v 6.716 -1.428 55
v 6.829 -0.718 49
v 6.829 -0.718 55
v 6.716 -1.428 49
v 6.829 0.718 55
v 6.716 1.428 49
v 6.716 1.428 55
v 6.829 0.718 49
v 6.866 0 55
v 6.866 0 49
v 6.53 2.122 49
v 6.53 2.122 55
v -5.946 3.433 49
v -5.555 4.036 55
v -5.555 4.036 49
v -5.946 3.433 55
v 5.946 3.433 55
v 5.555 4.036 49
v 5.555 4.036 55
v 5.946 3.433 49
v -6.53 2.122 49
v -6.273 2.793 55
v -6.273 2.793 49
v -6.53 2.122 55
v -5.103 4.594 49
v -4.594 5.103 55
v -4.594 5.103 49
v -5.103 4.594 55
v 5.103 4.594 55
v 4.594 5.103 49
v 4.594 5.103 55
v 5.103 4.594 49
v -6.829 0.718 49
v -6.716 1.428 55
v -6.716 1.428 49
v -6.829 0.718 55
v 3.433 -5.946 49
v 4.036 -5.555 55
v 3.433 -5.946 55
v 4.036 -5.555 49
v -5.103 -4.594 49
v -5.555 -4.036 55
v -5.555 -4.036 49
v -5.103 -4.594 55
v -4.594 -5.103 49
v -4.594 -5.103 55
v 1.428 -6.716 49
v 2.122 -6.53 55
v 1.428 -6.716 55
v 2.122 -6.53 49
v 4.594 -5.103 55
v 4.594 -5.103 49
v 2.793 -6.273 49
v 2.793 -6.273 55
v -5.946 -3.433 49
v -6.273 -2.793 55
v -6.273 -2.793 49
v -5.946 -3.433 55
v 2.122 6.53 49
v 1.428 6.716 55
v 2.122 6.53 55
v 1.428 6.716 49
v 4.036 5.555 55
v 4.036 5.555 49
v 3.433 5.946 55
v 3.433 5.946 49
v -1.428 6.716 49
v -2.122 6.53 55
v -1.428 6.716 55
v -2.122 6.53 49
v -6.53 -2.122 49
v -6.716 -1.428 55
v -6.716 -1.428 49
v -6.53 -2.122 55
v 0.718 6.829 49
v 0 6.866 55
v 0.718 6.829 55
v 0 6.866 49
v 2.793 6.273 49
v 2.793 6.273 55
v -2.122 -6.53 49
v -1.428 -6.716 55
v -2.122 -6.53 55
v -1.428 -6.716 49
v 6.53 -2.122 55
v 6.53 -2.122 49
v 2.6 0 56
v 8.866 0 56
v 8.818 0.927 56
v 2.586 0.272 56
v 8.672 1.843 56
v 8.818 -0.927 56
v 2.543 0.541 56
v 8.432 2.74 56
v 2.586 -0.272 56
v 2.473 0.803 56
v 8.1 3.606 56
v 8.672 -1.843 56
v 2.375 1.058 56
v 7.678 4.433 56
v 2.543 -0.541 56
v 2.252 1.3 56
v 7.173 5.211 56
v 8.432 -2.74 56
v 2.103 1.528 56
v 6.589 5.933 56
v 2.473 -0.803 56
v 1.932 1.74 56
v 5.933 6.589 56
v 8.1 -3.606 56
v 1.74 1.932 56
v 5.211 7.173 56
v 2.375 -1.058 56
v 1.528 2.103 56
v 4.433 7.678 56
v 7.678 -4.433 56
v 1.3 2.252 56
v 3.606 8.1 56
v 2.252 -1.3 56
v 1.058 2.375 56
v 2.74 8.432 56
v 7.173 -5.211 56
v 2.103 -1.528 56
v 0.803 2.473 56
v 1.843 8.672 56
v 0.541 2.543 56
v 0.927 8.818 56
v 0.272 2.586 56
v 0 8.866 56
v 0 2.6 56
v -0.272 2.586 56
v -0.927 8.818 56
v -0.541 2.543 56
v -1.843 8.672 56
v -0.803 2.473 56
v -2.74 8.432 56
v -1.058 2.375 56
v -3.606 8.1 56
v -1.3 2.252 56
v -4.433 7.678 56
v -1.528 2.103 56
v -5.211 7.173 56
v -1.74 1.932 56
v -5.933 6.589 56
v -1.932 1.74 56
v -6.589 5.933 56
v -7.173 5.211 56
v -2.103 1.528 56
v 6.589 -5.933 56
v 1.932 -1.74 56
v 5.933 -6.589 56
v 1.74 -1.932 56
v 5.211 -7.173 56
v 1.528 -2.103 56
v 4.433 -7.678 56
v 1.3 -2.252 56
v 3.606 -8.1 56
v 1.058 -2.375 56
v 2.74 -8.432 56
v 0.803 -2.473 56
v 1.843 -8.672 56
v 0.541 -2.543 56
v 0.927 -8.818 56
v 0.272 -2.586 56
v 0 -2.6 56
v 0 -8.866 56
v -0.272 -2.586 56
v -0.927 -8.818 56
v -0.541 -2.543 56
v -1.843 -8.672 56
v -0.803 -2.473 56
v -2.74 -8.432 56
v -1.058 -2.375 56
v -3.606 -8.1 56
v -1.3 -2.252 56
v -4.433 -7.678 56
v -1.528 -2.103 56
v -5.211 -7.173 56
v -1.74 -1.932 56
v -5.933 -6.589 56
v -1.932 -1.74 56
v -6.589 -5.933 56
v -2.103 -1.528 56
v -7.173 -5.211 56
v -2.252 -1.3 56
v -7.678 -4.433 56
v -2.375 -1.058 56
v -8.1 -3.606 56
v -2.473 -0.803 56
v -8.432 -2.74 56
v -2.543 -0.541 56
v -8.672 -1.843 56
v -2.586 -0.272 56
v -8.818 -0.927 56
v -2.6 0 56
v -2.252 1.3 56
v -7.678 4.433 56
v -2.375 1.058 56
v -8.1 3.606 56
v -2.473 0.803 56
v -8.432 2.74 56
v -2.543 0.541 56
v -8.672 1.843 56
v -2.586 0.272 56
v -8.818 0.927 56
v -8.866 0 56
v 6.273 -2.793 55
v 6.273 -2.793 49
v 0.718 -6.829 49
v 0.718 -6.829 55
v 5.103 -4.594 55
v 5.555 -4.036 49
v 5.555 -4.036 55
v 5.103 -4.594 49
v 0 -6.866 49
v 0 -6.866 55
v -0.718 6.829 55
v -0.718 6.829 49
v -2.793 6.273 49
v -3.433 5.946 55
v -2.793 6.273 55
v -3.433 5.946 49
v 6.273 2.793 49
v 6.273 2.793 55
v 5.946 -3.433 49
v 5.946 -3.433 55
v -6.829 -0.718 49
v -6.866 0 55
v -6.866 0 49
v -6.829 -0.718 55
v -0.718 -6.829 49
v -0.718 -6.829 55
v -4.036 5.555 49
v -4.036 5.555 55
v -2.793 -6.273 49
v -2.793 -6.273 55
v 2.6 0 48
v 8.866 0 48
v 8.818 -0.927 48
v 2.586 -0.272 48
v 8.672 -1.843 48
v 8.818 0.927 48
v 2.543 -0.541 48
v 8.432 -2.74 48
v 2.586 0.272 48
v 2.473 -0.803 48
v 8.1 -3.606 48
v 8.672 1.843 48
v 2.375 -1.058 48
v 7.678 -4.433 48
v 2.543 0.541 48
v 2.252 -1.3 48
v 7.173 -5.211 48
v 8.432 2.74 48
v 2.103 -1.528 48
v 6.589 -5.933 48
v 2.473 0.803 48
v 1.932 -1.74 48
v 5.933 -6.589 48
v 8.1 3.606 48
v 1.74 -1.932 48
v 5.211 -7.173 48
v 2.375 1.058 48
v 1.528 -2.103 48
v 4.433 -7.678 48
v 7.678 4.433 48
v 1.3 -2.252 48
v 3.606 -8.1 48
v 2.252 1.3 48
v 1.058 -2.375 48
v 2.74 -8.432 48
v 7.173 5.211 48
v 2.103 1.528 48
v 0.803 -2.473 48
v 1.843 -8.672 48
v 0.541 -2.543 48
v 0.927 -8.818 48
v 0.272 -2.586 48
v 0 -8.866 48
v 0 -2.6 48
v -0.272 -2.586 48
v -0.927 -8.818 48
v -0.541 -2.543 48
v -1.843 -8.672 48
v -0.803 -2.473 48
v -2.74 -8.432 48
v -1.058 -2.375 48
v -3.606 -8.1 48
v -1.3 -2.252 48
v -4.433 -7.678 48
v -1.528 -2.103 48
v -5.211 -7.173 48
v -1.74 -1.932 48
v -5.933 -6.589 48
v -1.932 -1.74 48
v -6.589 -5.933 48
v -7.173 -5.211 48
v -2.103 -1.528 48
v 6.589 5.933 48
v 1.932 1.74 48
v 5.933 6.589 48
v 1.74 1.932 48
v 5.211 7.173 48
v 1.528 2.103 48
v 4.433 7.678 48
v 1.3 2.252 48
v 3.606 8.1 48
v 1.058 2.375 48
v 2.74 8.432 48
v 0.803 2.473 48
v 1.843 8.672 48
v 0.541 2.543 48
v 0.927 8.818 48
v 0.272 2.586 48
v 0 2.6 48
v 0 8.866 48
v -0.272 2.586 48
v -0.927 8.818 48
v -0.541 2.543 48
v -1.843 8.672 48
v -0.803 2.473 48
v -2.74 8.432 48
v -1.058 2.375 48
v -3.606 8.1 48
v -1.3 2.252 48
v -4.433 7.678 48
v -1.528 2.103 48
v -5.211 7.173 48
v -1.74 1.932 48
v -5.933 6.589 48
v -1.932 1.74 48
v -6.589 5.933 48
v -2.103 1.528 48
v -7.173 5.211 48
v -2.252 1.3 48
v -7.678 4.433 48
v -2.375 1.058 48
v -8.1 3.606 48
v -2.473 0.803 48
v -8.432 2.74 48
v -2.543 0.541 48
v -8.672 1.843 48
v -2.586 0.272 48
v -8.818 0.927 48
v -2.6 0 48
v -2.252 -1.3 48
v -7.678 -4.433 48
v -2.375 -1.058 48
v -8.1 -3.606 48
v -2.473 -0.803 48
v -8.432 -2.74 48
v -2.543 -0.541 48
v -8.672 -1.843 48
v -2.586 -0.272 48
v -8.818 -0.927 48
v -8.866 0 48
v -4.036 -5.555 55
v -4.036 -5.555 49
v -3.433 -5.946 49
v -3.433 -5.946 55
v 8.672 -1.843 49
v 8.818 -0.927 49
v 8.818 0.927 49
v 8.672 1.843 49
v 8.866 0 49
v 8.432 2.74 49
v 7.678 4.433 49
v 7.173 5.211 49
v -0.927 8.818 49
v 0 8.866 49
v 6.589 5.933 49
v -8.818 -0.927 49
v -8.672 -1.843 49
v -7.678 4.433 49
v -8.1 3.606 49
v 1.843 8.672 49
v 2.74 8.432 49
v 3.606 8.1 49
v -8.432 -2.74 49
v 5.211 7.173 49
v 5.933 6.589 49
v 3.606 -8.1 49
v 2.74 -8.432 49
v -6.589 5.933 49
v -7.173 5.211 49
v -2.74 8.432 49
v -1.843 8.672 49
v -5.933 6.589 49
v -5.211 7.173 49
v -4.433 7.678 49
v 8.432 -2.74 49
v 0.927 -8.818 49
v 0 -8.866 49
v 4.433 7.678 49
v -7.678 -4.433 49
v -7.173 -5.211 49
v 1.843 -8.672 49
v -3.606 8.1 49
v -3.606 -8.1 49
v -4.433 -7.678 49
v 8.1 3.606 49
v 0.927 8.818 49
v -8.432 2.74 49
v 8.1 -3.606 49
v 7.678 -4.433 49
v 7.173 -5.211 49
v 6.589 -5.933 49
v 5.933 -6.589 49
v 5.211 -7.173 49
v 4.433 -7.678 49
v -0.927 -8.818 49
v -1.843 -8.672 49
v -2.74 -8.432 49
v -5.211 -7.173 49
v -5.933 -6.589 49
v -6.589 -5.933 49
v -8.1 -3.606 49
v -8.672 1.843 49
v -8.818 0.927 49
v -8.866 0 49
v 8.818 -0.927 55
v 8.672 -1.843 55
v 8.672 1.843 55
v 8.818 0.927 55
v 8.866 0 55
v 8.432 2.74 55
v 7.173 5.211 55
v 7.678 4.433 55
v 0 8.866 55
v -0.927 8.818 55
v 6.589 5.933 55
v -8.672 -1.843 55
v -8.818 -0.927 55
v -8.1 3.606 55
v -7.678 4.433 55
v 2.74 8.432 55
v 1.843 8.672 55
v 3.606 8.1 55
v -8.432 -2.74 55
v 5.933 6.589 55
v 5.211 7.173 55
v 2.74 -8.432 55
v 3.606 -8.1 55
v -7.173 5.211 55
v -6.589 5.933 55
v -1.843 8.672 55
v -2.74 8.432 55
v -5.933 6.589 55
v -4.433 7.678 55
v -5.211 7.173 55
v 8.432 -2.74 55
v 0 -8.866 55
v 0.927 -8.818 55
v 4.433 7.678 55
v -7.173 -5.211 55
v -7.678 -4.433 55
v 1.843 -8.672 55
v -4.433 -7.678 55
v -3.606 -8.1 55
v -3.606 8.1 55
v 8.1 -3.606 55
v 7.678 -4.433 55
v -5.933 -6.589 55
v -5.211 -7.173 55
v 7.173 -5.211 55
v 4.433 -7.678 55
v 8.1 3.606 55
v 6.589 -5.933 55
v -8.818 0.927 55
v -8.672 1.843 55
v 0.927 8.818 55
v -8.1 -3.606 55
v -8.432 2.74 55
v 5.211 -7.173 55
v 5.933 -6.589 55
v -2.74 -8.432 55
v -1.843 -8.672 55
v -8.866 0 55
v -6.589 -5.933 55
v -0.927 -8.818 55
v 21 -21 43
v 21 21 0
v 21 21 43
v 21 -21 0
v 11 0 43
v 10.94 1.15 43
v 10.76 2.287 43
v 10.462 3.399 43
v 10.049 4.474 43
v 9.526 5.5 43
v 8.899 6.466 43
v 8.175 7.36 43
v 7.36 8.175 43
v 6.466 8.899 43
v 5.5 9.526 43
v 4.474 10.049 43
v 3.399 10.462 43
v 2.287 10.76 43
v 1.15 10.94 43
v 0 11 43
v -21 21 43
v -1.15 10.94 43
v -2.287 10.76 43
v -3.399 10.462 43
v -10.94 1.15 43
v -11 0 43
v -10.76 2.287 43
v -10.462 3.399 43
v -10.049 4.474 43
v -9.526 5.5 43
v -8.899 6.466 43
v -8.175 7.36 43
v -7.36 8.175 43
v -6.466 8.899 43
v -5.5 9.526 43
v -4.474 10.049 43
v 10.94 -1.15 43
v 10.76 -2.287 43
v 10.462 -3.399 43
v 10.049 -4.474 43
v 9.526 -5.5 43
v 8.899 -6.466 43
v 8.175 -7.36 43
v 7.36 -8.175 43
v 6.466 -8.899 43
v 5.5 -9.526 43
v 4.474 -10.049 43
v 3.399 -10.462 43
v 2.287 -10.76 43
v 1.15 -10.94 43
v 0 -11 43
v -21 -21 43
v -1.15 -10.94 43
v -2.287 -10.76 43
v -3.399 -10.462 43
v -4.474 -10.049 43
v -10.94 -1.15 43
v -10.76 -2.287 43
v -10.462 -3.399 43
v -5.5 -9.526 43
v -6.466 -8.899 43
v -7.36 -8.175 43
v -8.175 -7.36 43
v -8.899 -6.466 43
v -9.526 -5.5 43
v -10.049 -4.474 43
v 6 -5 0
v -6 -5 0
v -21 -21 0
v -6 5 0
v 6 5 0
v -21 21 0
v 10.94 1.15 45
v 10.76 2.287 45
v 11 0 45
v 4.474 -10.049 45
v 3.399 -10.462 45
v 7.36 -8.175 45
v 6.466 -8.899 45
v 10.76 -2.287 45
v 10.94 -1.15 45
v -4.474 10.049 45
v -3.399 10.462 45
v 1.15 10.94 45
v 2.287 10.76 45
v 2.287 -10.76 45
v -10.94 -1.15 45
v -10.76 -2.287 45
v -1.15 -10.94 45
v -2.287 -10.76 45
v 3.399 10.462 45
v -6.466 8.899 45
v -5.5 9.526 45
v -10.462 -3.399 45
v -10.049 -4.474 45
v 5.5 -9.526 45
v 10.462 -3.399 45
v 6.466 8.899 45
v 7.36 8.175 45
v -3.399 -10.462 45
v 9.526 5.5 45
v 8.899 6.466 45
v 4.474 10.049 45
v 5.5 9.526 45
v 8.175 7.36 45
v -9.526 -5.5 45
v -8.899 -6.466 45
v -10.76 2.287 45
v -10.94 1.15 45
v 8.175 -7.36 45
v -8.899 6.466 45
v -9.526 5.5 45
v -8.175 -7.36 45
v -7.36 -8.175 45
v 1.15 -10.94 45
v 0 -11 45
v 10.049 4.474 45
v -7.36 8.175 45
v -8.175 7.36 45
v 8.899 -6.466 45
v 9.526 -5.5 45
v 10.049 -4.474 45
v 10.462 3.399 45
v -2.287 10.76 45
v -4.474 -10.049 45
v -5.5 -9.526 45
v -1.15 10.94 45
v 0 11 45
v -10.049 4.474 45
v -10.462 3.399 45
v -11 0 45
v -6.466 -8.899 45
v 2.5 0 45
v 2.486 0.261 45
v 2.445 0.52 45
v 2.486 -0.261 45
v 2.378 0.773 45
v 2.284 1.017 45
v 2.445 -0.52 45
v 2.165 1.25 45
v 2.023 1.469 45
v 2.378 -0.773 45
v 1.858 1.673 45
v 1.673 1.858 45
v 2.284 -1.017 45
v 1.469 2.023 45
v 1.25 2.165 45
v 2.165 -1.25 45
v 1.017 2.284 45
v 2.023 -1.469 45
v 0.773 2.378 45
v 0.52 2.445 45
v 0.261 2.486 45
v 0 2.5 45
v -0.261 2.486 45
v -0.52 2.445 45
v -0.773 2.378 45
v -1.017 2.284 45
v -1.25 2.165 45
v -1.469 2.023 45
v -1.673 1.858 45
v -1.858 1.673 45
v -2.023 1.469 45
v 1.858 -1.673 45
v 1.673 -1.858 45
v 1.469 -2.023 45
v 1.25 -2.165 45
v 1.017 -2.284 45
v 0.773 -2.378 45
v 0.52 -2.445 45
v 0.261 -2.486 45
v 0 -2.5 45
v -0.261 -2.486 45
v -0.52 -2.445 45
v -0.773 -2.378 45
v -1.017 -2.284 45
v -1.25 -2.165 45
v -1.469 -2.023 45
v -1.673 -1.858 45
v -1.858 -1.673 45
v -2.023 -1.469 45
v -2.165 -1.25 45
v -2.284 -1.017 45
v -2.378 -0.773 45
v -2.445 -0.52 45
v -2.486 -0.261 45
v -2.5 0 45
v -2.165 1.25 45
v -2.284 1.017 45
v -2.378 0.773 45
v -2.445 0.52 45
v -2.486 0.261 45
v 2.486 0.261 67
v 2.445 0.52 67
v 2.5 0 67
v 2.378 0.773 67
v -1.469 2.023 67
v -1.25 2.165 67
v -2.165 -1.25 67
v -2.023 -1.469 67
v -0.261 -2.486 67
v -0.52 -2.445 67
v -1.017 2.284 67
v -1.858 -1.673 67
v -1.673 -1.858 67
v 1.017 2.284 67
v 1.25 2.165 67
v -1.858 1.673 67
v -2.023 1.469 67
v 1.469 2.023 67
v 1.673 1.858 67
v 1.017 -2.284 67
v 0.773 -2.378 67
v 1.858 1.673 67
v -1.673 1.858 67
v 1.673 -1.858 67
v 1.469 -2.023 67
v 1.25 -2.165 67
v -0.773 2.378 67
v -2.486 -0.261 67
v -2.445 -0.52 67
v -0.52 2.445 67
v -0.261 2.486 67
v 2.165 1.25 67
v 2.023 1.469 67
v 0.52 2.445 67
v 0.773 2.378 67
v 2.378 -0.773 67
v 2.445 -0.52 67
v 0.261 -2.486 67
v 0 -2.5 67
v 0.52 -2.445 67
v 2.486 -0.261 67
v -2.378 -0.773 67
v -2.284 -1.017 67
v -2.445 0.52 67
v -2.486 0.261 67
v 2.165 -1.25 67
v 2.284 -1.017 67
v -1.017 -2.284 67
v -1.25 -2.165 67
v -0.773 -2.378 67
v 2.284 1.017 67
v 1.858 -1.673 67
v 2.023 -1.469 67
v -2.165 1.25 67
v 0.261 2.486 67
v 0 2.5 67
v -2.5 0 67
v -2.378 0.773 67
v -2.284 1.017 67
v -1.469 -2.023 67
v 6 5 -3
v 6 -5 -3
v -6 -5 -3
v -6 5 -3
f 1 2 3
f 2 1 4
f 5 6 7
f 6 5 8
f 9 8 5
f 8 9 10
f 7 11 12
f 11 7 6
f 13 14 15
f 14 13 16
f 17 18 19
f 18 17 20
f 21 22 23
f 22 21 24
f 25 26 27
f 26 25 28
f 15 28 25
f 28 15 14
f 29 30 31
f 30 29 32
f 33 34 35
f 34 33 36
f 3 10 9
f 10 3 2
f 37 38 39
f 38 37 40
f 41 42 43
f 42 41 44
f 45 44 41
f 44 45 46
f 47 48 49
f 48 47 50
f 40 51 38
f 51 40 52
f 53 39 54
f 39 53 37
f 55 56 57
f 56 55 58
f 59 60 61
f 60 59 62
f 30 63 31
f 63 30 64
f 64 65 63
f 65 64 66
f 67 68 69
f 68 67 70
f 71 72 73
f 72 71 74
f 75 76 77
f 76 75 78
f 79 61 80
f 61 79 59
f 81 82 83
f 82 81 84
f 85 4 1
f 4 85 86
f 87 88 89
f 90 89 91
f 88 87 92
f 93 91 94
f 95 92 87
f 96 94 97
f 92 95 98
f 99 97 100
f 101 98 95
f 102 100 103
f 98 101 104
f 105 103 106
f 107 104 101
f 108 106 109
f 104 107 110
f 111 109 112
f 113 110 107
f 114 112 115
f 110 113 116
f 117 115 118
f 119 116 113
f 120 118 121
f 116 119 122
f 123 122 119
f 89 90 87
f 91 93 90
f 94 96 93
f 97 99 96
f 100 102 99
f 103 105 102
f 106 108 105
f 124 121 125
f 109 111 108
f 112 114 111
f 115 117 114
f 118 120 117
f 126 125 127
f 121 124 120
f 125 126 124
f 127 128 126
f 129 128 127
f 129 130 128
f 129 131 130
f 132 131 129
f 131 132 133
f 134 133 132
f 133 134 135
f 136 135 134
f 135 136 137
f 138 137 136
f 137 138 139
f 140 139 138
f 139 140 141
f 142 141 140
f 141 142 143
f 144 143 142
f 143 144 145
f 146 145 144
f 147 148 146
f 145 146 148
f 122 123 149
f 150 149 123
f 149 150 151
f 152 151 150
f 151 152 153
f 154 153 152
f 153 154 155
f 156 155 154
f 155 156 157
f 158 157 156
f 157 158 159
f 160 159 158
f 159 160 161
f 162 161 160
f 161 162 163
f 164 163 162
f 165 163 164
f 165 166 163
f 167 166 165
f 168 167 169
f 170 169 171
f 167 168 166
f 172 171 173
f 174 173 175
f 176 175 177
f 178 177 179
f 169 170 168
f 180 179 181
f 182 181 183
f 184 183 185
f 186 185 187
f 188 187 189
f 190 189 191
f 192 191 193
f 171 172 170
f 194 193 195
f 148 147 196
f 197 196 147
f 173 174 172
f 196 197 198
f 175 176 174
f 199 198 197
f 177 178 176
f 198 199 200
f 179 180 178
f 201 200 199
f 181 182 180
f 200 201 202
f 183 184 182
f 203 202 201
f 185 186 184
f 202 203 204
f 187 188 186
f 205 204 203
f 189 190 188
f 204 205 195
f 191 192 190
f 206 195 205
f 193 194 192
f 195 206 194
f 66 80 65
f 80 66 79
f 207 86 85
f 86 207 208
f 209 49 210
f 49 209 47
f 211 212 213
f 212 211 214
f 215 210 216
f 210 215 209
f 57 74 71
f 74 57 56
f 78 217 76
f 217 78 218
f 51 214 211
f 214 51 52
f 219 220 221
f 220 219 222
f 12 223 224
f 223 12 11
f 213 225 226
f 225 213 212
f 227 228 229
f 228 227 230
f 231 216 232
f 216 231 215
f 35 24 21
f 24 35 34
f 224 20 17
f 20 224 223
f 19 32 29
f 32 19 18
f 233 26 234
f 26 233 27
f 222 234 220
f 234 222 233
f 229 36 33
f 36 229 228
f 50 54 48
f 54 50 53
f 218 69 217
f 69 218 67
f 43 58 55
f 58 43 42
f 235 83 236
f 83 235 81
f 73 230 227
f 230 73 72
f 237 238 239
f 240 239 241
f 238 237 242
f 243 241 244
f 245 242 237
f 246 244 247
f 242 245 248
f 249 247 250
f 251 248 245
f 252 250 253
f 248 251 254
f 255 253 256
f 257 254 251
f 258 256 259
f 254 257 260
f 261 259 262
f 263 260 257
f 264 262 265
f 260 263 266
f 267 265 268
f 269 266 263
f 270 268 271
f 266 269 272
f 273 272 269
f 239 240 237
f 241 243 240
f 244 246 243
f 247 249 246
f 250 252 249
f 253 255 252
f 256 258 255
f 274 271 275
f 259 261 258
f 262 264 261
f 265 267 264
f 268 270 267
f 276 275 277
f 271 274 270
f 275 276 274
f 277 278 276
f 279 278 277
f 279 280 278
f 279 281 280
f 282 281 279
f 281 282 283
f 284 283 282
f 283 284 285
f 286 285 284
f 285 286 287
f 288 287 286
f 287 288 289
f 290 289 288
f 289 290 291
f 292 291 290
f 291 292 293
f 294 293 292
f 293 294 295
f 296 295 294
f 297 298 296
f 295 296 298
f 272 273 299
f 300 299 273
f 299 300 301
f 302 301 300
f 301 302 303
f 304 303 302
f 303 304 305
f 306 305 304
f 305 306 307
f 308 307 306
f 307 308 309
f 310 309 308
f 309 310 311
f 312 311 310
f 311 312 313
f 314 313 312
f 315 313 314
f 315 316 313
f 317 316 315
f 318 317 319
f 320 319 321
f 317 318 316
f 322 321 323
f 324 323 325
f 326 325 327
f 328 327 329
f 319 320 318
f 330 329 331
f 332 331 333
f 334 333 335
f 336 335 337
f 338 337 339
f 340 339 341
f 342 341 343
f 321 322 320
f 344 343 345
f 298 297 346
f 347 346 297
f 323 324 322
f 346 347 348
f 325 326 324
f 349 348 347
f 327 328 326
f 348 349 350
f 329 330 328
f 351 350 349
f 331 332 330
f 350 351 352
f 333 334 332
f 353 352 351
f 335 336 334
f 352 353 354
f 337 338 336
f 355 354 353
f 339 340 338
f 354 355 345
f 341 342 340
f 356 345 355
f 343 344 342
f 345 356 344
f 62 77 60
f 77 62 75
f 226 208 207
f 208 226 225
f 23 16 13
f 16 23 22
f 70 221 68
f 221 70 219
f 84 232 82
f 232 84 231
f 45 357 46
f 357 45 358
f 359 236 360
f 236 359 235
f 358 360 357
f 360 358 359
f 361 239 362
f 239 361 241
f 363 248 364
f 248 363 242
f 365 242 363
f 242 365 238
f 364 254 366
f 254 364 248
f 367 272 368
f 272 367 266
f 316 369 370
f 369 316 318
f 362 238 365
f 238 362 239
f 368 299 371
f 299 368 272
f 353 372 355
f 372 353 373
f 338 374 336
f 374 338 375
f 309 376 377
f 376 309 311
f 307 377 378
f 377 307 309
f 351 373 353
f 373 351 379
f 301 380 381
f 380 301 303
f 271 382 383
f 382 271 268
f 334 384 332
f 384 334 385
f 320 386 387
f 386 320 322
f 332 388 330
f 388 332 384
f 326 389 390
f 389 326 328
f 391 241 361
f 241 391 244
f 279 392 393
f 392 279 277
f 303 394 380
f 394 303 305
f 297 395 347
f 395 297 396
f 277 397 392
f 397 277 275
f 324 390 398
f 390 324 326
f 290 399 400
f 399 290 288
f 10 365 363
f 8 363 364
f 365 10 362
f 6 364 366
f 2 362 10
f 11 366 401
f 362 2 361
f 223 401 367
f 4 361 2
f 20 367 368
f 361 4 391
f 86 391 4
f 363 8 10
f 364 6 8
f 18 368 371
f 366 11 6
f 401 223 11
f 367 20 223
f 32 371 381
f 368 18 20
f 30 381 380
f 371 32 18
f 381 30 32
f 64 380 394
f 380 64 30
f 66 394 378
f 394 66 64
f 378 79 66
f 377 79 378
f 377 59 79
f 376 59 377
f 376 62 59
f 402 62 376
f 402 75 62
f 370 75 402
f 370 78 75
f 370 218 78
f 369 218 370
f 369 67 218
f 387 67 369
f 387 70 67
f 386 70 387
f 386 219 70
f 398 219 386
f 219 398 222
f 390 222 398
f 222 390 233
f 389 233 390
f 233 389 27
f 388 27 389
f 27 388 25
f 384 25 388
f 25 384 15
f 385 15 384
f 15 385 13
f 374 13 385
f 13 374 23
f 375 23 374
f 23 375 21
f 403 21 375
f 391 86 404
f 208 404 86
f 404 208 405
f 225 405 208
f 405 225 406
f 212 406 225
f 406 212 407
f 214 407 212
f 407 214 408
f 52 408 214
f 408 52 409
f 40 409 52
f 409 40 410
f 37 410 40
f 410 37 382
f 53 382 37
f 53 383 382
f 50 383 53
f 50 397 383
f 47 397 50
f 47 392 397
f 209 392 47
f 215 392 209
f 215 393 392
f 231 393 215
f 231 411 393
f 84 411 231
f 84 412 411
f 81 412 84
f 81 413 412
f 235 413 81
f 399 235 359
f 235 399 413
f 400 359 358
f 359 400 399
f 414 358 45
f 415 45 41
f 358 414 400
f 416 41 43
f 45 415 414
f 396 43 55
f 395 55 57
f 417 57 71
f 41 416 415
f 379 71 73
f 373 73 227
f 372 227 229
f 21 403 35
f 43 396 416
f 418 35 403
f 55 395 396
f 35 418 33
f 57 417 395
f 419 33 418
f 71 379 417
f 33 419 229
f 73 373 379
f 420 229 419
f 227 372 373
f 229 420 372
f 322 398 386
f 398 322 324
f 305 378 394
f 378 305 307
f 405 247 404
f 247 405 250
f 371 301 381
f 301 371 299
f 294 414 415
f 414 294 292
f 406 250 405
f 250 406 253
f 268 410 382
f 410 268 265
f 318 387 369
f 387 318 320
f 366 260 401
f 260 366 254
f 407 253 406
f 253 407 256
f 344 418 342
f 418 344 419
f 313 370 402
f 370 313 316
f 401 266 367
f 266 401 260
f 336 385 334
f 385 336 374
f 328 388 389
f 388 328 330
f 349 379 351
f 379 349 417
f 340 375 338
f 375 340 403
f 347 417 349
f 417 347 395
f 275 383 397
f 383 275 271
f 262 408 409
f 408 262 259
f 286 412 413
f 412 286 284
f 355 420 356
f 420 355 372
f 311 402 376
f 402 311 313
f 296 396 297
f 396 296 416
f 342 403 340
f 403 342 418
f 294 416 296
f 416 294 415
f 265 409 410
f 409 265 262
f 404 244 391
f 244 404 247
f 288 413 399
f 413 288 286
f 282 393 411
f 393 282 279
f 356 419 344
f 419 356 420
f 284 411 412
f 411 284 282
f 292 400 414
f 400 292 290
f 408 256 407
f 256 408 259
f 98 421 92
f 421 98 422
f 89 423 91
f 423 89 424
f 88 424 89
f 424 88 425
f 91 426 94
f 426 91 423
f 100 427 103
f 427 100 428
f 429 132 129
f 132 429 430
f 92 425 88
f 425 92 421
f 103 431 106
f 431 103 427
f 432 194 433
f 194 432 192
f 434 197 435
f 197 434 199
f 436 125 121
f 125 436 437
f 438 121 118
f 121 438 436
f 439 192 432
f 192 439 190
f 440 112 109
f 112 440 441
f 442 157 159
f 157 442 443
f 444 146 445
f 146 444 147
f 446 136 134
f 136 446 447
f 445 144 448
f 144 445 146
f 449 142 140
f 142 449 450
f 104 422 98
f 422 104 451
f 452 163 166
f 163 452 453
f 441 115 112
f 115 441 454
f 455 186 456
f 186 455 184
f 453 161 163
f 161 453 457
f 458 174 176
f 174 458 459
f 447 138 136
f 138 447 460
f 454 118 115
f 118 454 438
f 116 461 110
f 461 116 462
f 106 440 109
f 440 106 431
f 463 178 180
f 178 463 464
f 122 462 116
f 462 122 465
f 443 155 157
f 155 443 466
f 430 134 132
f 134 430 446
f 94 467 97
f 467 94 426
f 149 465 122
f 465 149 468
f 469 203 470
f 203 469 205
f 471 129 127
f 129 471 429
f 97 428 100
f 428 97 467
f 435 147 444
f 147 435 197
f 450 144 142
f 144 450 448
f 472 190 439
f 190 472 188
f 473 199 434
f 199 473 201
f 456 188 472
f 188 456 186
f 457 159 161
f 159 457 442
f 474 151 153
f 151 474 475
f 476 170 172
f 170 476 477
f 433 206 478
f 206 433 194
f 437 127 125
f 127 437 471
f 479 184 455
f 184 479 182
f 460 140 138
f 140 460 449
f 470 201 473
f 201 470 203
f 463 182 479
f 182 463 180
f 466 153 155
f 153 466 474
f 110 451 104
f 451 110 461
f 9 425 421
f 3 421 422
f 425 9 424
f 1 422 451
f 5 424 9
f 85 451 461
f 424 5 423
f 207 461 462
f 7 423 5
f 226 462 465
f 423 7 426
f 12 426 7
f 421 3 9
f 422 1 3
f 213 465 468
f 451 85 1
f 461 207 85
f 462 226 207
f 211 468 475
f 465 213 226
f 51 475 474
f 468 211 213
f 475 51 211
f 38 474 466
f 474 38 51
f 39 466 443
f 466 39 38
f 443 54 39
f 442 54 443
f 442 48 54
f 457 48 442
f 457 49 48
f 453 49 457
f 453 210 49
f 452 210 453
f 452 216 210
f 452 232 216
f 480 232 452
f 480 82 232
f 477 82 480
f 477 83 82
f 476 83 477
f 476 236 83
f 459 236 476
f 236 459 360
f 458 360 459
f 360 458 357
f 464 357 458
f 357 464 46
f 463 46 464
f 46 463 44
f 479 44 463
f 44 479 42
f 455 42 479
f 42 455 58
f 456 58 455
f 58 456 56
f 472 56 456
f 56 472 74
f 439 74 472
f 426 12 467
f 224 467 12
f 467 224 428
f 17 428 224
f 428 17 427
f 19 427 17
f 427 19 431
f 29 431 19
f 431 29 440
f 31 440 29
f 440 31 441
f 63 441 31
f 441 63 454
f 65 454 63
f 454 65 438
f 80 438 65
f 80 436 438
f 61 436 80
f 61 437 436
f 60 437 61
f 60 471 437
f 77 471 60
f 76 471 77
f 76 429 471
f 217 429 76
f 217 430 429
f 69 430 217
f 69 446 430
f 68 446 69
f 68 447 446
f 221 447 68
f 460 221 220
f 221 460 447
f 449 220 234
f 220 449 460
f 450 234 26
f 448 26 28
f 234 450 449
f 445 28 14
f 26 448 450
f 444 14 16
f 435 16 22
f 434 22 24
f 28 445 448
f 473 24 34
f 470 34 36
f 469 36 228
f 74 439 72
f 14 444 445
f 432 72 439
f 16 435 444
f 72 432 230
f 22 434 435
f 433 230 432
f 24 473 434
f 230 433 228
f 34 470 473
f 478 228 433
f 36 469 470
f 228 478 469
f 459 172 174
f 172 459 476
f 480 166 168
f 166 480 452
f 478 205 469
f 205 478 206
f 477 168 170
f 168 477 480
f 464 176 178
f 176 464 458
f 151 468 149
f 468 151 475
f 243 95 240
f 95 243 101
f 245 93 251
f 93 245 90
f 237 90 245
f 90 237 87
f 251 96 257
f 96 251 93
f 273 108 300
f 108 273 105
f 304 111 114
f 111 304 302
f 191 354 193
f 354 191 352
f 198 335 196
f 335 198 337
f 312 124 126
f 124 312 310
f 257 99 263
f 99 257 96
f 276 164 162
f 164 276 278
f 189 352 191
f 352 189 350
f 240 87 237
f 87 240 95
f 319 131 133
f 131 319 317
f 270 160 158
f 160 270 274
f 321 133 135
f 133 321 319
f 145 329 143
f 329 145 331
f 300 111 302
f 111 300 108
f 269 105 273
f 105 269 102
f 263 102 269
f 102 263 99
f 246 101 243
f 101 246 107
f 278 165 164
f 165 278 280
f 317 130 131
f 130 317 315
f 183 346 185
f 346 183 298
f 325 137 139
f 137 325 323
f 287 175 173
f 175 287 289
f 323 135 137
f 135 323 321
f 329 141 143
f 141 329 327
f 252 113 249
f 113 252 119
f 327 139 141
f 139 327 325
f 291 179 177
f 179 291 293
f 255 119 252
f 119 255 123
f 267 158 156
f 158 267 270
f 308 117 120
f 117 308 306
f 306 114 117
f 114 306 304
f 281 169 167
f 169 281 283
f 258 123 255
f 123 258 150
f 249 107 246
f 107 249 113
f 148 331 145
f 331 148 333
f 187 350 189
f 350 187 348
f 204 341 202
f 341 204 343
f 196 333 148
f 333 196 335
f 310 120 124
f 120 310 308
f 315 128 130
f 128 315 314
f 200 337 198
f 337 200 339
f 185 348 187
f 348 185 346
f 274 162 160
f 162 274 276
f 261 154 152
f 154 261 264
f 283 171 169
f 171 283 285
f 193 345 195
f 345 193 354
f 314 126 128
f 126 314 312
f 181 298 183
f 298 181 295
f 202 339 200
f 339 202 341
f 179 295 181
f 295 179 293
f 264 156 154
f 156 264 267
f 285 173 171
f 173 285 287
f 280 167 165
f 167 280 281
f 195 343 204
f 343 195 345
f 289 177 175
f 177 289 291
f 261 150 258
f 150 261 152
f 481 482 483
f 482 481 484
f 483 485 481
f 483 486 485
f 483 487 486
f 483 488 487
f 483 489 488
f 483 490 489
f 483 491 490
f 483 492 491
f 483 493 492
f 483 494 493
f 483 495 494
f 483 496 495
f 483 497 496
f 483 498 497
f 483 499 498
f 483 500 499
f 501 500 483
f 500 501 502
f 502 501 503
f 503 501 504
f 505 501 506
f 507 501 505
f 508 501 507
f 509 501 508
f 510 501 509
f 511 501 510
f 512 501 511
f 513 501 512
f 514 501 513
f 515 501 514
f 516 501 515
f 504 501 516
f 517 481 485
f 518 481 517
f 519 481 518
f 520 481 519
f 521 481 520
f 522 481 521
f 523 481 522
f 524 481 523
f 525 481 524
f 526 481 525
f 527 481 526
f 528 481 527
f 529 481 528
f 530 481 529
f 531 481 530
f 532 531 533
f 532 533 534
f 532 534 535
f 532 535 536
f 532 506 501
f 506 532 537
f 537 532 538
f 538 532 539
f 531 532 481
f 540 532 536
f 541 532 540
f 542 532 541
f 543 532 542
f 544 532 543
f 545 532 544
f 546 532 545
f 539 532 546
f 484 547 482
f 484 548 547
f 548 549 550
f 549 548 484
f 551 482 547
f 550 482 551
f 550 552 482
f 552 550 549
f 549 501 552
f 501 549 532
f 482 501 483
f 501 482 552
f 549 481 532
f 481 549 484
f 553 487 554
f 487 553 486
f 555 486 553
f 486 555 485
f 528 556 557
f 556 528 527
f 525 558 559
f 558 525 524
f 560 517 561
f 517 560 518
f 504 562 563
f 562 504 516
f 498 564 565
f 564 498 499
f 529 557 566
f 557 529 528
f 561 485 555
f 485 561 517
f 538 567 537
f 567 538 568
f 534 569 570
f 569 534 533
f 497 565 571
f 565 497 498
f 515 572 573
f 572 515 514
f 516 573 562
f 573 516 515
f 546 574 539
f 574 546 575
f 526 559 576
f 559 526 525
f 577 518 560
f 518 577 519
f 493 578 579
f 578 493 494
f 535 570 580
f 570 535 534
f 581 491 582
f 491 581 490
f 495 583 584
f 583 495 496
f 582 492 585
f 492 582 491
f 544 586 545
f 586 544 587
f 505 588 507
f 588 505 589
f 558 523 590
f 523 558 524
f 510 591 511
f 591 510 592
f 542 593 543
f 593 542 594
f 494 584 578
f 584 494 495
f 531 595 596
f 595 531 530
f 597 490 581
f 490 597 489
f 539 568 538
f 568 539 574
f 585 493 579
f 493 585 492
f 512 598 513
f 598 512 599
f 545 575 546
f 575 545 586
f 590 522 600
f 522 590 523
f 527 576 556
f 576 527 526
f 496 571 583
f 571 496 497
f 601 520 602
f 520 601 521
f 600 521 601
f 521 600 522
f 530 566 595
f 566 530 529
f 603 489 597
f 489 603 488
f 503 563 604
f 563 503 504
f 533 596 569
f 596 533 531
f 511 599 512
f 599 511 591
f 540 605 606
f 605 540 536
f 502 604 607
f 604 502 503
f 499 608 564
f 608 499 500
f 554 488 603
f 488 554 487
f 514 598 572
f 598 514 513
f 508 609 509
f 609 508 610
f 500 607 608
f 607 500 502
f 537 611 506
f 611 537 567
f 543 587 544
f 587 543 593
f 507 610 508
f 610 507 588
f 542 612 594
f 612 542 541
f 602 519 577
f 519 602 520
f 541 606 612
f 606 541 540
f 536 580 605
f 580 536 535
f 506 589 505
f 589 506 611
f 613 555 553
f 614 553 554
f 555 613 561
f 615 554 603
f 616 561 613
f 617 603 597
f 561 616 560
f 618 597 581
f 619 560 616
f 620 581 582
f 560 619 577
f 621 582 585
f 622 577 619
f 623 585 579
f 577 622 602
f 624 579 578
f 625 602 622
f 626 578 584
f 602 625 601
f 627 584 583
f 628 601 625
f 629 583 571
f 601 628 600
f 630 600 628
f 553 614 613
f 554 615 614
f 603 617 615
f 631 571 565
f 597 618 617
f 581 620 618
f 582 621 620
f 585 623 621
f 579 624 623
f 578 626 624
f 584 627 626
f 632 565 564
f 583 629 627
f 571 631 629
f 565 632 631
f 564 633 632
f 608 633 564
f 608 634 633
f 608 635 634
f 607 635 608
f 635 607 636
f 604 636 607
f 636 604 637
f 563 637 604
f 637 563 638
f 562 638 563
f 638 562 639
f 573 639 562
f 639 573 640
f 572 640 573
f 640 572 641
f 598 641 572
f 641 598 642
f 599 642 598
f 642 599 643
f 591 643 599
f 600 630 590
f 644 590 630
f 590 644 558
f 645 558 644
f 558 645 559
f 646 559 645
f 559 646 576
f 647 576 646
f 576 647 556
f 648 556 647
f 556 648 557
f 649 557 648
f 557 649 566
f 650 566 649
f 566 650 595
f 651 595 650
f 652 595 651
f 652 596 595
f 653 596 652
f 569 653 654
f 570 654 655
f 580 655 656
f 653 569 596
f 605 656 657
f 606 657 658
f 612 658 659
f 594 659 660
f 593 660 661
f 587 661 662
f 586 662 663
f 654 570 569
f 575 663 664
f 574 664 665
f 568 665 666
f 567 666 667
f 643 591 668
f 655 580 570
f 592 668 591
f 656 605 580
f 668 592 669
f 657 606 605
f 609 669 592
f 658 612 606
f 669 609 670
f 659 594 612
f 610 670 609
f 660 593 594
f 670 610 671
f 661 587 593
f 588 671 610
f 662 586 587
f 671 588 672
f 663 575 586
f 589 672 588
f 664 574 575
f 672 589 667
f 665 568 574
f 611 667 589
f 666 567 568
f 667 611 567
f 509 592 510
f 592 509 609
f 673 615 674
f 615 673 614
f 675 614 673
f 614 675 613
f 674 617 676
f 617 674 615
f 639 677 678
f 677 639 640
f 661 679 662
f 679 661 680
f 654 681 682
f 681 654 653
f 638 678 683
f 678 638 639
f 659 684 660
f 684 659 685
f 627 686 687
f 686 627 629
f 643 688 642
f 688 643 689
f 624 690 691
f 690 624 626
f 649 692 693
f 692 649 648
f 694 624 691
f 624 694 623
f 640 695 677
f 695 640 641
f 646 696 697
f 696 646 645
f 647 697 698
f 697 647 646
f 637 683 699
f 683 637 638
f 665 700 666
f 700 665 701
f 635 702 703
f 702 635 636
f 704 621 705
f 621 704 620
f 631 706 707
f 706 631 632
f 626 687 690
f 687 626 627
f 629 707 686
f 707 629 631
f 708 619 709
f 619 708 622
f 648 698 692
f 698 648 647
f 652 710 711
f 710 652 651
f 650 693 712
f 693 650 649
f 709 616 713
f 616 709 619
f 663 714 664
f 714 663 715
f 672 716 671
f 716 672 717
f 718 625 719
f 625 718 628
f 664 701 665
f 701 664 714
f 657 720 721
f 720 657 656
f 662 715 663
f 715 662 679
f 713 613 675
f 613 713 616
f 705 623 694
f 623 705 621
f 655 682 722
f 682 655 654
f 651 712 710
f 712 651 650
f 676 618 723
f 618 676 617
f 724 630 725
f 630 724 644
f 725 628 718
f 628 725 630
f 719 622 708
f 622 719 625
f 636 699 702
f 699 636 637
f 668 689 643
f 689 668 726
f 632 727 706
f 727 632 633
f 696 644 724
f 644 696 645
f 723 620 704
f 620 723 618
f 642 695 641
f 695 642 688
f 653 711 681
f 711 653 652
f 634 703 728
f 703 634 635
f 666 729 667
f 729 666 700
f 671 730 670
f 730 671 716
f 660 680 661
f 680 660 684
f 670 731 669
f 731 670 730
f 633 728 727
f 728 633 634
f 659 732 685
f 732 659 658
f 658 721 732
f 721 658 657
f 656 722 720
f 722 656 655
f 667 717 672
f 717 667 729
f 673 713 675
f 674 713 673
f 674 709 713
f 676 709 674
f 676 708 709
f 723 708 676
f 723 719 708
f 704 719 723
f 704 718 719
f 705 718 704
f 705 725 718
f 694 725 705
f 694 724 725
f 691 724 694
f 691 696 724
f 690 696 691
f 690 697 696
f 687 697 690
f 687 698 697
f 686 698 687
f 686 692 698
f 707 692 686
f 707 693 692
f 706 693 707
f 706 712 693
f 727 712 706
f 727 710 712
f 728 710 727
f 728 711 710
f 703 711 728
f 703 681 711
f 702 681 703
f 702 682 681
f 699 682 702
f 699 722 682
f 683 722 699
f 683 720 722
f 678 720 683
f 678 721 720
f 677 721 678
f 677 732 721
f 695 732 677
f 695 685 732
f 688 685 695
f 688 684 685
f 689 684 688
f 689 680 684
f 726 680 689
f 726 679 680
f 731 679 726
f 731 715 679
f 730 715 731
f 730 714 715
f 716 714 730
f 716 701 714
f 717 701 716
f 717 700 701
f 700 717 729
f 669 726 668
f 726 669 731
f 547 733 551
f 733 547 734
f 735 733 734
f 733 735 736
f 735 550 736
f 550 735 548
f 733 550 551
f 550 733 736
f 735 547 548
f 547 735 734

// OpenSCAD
// file: _params.scad
// =========================================================================
// 공유 파라미터 (모든 개별 부품 파일에서 include)
// 메인 어셈블리: cup_z_x_catrage_frame_water_mic_anti_3030.scad 에서 추출
// 프레임: 600 × 420 × 700mm (3030 프로파일, Y=0 대칭)
// =========================================================================

$fn = 60;  // 부품 출력용 고해상도
GLOBAL_TOLERANCE = 0.2;

// --- [1] 하부 기성품 및 원통 파라미터 ---
X_RAIL_LEN = 290.0;
X_BLOCK_W = 42.0; X_BLOCK_L = 59.0;
X_PITCH_X = 20.0; X_PITCH_Y = 32.0;
X_RAIL_W = 40.0;  X_RAIL_H = 30.0;

MOTOR_W = 42.0;      MOTOR_PITCH = 31.0; MOTOR_HOLE_D = 3.5;    
MOTOR_BOSS_D = 22.0; MOTOR_BOSS_H = 2.0; SCREW_D = 8.0;         

CUP_ID = 100.0;  CUP_WALL = 5.0; CUP_OD = 110.0;     // 아크릴 원통 OD110/ID100
CUP_H = 180.0;   CAGE_H = 60.0;  FLOOR_H = 10.0; PISTON_H = 20.0;     

LIP_D = 30.0;    LIP_H = 5.0;    LEAK_DRAIN_D = 4.0;    
GUIDE_PIPE_D = 10.0; BUSHING_OD = 12.0; BUSHING_H = 8.0;       
DRAIN_RADIUS = 35.0; DRAIN_D = 10.0;        

Y_OFFSET = 85.0; BRKT_H = 12.0; BRKT_D = 122.0; BRKT_ID = 62.0; Z_MOUNT_PCD = 86.0;   

// --- [2] 아크릴 파이프 및 상부 카트리지 ---
ACRYL_ID = 100.0; ACRYL_T = 5.0; ACRYL_OD = ACRYL_ID + (ACRYL_T * 2);  // OD110 (아크릴집 106 재고없음 → 컵과 동일 규격)

REVOLVER_PCD = 240.0;     // 인접 카트리지 웹 9.8mm 확보 (OD110 대응, 230→240)
CARTRIDGE_OD = REVOLVER_PCD + ACRYL_OD + 8; 
TOP_PLATE_H = 15.0;       // 아크릴 15T 통판 (보스홀 단 깊이 10mm)

HUB_D = 60.0;            
SHAFT_D = 12.0;          
HUB_WALL = 4.0;          
HUB_H = 15.0;             // 아크릴 5T × 3장 적층 — 파이프 130mm 대응
POCKET_DEPTH = 5.0;
MID_HUB_Z = 68.5;          // 중단 허브 하면 Z (FLOAT_H=2 보정, 절대좌표 유지)
UPPER_HUB_Z = 135.0;       // 상단 허브 하면 Z (전체 135+15=150 유지)
BOSS_OD = 35.0;
BOSS_H = 11.0;             // 보스11 + 와셔1 = 12, 리세스10 → 허브 2mm 공중

// --- [3] GT2 벨트 구동 시스템 ---
GT2_PITCH     = 2.0;
GT2_BELT_W    = 6.0;
BIG_PULLEY_TEETH = 566;
BIG_PULLEY_PD = BIG_PULLEY_TEETH * GT2_PITCH / PI;
BIG_PULLEY_OD = BIG_PULLEY_PD + 1.0;
SMALL_PULLEY_TEETH = 20;
SMALL_PULLEY_PD = SMALL_PULLEY_TEETH * GT2_PITCH / PI;
SMALL_PULLEY_OD = SMALL_PULLEY_PD + 1.0;

BELT_MOTOR_X = -300;
BELT_MOTOR_Y = -155.5;
BRKT_MOTOR_H = 25.0;
BRKT_MOTOR_W = 45.0;
SLOT_LEN = 10.0;
FLAG_W = 15.0;  FLAG_H = 8.0;  FLAG_T = 1.5;

X_POS_MEASURE = 170.0;   // X_M~X_R 정중앙, X대칭

// --- [4] 3030 프레임 경계 (600×430×700mm) ---
PF = 30;             // 3030 알루미늄 프로파일
WASHER_T = 1.0;     

X_L = -320;
X_M = 60;
X_R = 250;
Y_F = -210;          // 전방 (대칭: -210+30=-180, Y=0 중심)
Y_B = 180;           // 후방 (대칭: 180+30=210, Y=0 중심) — 메인파일과 동기화

Z_BOT = -480;
Z_RAIL = -322;
Z_MID = -TOP_PLATE_H - PF;
Z_TOP = 220;

SUPPORT_PILLAR_H = Z_TOP - PF;

SHAFT_SQ = 20;       // 2020 사각 회전축

// 사각 축 홀 크기
SQ = SHAFT_SQ + GLOBAL_TOLERANCE;  // 20.2mm

// --- 리볼버/컵 축 정렬 (보스홀=판 중심에 리볼버 정렬) ---
REVOLVER_CX = (X_L + X_M + PF)/2;        // 판 중심 = 보스홀 = 리볼버 회전축 (-115)
DROP_X      = REVOLVER_CX + REVOLVER_PCD/2;  // 링 드롭 / 컵 적재 축 (+5)

// --- [5] 모터 체결홀 (베이스 플레이트 ↔ 모터 브래킷 슬롯 공유) ---
MOTOR_BOLT_PITCH    = 25;        // Y피치 (모터축 기준 ±12.5)
MOTOR_BOLT_X_NOMINAL = X_L + 55; // 1열: 판 좌단 55 (모터 기본 위치)
MOTOR_BOLT_X_SHIFT   = X_L + 40; // 2열: 판 좌단 40 (모터 좌측 이동 대비)

// 모터 마운트 볼트 카운터보어 (단볼트용 — 브래킷 두께 25 중 깊게 파냄)
MOTOR_CB_D     = 6.5;            // M3 캡볼트 머리 클리어런스
MOTOR_CB_DEPTH = 19;             // 카운터보어 깊이 (잔여 통과 6mm → M3×10 단볼트)
// main file
// =========================================================================
// [구매] 벨트 구동 모터 + 풀리 세트
// 구매: NEMA17 + GT2 20T 풀리 + GT2 타이밍벨트
// 메인 파일 belt_drive_motor_assembly() 구매 부품만 추출 (브래킷 제외)
// 원점: 모터 하면(브래킷 접촉면) = Z=0, 축 상향
// =========================================================================
include <_params.scad>

MOT_BODY_L = 43;
SHAFT_L = 24;
PULLEY_Z = MOT_BODY_L + 5;

// ── ① NEMA 17 모터 본체 (축 상향) ──
color([0.1, 0.1, 0.1])
    translate([-MOTOR_W/2, -MOTOR_W/2, 0])
        cube([MOTOR_W, MOTOR_W, MOT_BODY_L]);

// ── ② 모터 보스 (ø22 × 2mm, 상면) ──
color([0.25, 0.25, 0.25])
    translate([0, 0, MOT_BODY_L])
        cylinder(d=MOTOR_BOSS_D, h=MOTOR_BOSS_H);

// ── ③ 모터 축 (상면에서 위로 돌출) ──
color([0.7, 0.7, 0.7])
    translate([0, 0, MOT_BODY_L])
        cylinder(d=5, h=SHAFT_L);

// ── ④ GT2 20치 풀리 ──
color([0.8, 0.75, 0.1]) translate([0, 0, PULLEY_Z]) difference() {
    union() {
        cylinder(d=SMALL_PULLEY_OD, h=GT2_BELT_W + 2);
        cylinder(d=SMALL_PULLEY_OD + 4, h=1);               // 하부 플랜지
        translate([0, 0, GT2_BELT_W + 1])
            cylinder(d=SMALL_PULLEY_OD + 4, h=1);           // 상부 플랜지
    }
    translate([0, 0, -1]) cylinder(d=5.2, h=GT2_BELT_W + 4);
}

// ── ⑤ 배선 커넥터 (모터 하면) ──
color([0.9, 0.9, 0.9])
    translate([-6, -5, -3])
        cube([12, 10, 3]);
